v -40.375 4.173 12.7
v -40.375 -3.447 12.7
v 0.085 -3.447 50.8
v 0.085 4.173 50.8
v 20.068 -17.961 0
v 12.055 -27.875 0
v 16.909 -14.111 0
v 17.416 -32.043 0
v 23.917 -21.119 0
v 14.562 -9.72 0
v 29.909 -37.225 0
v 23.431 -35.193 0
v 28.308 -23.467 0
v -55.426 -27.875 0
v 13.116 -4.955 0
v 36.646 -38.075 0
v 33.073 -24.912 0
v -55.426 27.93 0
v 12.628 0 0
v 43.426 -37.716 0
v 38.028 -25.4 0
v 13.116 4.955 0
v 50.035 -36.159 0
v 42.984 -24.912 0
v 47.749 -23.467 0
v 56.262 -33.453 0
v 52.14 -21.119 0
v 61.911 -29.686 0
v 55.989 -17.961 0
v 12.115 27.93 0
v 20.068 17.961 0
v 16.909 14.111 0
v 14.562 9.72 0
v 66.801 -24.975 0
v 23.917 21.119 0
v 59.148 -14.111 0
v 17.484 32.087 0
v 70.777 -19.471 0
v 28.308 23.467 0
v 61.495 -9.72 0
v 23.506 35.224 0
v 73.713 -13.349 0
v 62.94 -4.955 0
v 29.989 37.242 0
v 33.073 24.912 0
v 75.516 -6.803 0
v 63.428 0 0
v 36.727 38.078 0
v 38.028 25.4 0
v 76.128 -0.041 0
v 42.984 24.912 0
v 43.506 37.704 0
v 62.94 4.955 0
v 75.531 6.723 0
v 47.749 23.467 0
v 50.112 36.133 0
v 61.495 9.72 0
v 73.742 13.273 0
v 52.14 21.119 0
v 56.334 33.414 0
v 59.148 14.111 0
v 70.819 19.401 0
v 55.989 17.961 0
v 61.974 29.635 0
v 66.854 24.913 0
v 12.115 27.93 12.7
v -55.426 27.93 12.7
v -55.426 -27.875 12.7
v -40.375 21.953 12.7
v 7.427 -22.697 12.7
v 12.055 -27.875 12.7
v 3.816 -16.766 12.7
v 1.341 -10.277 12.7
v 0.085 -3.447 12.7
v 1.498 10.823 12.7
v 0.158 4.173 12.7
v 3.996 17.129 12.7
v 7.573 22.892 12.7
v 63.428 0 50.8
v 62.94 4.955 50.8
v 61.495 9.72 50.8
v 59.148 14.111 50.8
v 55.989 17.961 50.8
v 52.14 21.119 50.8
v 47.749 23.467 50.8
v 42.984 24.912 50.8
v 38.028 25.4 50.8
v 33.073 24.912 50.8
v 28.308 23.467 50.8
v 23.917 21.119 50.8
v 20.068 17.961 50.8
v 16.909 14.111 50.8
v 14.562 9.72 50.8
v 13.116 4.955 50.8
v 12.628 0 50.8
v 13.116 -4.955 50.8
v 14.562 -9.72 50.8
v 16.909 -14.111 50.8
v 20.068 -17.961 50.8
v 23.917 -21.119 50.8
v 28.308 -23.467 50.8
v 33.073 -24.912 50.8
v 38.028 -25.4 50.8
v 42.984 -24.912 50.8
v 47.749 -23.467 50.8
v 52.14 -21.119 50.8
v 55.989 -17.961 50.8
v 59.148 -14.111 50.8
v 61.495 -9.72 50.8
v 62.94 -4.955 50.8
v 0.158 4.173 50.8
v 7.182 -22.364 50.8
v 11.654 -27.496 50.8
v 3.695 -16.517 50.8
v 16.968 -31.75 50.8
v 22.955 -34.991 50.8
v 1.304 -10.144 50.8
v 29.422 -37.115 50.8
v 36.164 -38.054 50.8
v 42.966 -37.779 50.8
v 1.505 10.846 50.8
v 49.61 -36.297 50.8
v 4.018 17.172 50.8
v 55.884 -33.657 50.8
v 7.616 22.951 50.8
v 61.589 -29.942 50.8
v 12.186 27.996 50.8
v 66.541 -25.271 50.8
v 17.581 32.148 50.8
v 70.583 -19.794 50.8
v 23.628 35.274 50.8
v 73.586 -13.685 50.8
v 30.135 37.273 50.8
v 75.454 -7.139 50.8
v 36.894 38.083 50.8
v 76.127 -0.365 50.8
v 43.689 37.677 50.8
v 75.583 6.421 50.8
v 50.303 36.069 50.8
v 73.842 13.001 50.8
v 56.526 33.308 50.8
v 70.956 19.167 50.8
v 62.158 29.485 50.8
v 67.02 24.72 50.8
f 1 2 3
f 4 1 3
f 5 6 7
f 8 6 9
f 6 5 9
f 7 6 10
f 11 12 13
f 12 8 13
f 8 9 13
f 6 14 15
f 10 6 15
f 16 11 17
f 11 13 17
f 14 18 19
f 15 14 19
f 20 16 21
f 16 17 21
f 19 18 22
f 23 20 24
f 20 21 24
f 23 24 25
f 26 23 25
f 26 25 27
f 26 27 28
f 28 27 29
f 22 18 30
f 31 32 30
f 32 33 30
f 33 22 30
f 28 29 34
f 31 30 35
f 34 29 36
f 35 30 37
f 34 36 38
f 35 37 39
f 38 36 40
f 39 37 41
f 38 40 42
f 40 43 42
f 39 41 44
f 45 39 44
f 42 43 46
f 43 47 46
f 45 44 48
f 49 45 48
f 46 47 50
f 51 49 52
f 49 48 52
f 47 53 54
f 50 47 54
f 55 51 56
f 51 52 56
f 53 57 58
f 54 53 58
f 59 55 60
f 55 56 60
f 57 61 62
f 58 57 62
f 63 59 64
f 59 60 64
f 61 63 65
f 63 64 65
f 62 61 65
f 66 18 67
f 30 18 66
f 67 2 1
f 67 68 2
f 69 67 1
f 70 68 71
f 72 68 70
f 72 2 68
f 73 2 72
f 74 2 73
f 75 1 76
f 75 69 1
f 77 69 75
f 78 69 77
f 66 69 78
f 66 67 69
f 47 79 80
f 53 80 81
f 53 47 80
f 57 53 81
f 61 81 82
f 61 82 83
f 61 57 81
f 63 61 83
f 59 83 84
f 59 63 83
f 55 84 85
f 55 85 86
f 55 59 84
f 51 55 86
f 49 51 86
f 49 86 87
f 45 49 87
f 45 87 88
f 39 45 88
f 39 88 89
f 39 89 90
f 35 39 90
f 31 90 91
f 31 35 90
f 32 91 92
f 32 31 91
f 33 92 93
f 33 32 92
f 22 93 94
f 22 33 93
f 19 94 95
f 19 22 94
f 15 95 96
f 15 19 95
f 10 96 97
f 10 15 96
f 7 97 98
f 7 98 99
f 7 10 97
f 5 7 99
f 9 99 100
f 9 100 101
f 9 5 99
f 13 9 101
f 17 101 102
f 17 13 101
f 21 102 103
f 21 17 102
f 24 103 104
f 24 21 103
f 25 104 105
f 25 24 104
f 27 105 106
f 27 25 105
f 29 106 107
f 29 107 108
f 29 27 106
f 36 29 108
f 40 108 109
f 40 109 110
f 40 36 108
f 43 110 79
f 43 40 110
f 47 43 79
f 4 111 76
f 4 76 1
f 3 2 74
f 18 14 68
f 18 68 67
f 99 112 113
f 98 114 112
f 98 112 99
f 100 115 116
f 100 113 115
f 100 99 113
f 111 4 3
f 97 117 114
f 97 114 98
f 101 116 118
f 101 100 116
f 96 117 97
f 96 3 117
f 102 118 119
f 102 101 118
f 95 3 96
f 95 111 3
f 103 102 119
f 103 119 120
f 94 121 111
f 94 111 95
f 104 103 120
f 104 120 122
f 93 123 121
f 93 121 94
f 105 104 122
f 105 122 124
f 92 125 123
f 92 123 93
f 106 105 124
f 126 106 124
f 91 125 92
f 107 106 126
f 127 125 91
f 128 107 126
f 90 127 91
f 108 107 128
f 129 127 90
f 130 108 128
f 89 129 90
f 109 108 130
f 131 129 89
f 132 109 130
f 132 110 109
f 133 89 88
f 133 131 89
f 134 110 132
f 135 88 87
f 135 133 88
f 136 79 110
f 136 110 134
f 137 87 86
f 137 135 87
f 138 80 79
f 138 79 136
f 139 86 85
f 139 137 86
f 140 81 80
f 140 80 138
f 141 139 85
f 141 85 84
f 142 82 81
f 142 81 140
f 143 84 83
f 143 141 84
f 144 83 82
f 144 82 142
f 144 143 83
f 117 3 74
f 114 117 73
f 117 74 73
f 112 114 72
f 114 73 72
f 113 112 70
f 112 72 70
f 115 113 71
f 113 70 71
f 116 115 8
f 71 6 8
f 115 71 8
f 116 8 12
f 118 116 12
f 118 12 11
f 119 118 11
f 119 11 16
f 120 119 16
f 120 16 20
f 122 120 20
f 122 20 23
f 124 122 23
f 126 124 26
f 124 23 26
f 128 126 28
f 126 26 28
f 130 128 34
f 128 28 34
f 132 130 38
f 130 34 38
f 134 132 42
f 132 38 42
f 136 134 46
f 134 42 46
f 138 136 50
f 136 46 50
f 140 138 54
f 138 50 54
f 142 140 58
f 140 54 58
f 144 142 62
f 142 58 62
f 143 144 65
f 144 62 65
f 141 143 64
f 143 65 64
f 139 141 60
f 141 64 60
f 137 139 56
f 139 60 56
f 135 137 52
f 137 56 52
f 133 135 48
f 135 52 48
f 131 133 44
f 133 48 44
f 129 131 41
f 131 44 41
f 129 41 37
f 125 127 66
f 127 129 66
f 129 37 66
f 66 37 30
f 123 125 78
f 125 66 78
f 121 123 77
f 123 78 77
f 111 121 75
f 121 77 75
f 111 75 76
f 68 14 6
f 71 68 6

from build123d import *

# Parameters (mm, degrees)
F0_R     = 38.1
F0_R_2   = 25.4
F1_DEPTH = 50.8
F2_W     = 67.6658935845
F2_H     = 55.8053161949
F3_DEPTH = 12.7
F5_DEPTH = 38.1
F7_DEPTH = 25.4


with BuildPart() as f1:
    # F0 (on Top) → F1 (new body)
    with BuildSketch(Plane.XY):
        with Locations((38.0283864189, 0)):
            Circle(F0_R)
        with Locations((38.0283864189, 0)):
            Circle(F0_R_2, mode=Mode.SUBTRACT)
    extrude(amount=F1_DEPTH)

    # F2 (on Top) → F3 (join)
    with BuildSketch(Plane.XY):
        with Locations((-21.5929765254, 0.0276817009)):
            Rectangle(F2_W, F2_H)
    extrude(amount=F3_DEPTH)

    # F4 (on face) → F5 (join)
    with BuildSketch(Plane.XY.offset(12.7)):
        with BuildLine():
            ThreePointArc((0.0846197344, -3.4468202446), (-0.0698650899, 0.3650095571), (0.1576249962, 4.1731797554))
            Line((0.1576249962, 4.1731797554), (-40.3746258327, 4.1731797554))
            Line((-40.3746258327, 4.1731797554), (-40.3746258327, -3.4468202446))
            Line((-40.3746258327, -3.4468202446), (0.0846197344, -3.4468202446))
        make_face()
    extrude(amount=F5_DEPTH)

    # F6 (on face) → F7 (cut)
    with BuildSketch(Plane.XZ.offset(3.4468202446)):
        Polygon((-40.3746258327, 12.7), (0.0846197344, 50.8), (-40.3746258327, 50.8), align=None)
    extrude(amount=-F7_DEPTH, mode=Mode.SUBTRACT)


solid = f1.part
